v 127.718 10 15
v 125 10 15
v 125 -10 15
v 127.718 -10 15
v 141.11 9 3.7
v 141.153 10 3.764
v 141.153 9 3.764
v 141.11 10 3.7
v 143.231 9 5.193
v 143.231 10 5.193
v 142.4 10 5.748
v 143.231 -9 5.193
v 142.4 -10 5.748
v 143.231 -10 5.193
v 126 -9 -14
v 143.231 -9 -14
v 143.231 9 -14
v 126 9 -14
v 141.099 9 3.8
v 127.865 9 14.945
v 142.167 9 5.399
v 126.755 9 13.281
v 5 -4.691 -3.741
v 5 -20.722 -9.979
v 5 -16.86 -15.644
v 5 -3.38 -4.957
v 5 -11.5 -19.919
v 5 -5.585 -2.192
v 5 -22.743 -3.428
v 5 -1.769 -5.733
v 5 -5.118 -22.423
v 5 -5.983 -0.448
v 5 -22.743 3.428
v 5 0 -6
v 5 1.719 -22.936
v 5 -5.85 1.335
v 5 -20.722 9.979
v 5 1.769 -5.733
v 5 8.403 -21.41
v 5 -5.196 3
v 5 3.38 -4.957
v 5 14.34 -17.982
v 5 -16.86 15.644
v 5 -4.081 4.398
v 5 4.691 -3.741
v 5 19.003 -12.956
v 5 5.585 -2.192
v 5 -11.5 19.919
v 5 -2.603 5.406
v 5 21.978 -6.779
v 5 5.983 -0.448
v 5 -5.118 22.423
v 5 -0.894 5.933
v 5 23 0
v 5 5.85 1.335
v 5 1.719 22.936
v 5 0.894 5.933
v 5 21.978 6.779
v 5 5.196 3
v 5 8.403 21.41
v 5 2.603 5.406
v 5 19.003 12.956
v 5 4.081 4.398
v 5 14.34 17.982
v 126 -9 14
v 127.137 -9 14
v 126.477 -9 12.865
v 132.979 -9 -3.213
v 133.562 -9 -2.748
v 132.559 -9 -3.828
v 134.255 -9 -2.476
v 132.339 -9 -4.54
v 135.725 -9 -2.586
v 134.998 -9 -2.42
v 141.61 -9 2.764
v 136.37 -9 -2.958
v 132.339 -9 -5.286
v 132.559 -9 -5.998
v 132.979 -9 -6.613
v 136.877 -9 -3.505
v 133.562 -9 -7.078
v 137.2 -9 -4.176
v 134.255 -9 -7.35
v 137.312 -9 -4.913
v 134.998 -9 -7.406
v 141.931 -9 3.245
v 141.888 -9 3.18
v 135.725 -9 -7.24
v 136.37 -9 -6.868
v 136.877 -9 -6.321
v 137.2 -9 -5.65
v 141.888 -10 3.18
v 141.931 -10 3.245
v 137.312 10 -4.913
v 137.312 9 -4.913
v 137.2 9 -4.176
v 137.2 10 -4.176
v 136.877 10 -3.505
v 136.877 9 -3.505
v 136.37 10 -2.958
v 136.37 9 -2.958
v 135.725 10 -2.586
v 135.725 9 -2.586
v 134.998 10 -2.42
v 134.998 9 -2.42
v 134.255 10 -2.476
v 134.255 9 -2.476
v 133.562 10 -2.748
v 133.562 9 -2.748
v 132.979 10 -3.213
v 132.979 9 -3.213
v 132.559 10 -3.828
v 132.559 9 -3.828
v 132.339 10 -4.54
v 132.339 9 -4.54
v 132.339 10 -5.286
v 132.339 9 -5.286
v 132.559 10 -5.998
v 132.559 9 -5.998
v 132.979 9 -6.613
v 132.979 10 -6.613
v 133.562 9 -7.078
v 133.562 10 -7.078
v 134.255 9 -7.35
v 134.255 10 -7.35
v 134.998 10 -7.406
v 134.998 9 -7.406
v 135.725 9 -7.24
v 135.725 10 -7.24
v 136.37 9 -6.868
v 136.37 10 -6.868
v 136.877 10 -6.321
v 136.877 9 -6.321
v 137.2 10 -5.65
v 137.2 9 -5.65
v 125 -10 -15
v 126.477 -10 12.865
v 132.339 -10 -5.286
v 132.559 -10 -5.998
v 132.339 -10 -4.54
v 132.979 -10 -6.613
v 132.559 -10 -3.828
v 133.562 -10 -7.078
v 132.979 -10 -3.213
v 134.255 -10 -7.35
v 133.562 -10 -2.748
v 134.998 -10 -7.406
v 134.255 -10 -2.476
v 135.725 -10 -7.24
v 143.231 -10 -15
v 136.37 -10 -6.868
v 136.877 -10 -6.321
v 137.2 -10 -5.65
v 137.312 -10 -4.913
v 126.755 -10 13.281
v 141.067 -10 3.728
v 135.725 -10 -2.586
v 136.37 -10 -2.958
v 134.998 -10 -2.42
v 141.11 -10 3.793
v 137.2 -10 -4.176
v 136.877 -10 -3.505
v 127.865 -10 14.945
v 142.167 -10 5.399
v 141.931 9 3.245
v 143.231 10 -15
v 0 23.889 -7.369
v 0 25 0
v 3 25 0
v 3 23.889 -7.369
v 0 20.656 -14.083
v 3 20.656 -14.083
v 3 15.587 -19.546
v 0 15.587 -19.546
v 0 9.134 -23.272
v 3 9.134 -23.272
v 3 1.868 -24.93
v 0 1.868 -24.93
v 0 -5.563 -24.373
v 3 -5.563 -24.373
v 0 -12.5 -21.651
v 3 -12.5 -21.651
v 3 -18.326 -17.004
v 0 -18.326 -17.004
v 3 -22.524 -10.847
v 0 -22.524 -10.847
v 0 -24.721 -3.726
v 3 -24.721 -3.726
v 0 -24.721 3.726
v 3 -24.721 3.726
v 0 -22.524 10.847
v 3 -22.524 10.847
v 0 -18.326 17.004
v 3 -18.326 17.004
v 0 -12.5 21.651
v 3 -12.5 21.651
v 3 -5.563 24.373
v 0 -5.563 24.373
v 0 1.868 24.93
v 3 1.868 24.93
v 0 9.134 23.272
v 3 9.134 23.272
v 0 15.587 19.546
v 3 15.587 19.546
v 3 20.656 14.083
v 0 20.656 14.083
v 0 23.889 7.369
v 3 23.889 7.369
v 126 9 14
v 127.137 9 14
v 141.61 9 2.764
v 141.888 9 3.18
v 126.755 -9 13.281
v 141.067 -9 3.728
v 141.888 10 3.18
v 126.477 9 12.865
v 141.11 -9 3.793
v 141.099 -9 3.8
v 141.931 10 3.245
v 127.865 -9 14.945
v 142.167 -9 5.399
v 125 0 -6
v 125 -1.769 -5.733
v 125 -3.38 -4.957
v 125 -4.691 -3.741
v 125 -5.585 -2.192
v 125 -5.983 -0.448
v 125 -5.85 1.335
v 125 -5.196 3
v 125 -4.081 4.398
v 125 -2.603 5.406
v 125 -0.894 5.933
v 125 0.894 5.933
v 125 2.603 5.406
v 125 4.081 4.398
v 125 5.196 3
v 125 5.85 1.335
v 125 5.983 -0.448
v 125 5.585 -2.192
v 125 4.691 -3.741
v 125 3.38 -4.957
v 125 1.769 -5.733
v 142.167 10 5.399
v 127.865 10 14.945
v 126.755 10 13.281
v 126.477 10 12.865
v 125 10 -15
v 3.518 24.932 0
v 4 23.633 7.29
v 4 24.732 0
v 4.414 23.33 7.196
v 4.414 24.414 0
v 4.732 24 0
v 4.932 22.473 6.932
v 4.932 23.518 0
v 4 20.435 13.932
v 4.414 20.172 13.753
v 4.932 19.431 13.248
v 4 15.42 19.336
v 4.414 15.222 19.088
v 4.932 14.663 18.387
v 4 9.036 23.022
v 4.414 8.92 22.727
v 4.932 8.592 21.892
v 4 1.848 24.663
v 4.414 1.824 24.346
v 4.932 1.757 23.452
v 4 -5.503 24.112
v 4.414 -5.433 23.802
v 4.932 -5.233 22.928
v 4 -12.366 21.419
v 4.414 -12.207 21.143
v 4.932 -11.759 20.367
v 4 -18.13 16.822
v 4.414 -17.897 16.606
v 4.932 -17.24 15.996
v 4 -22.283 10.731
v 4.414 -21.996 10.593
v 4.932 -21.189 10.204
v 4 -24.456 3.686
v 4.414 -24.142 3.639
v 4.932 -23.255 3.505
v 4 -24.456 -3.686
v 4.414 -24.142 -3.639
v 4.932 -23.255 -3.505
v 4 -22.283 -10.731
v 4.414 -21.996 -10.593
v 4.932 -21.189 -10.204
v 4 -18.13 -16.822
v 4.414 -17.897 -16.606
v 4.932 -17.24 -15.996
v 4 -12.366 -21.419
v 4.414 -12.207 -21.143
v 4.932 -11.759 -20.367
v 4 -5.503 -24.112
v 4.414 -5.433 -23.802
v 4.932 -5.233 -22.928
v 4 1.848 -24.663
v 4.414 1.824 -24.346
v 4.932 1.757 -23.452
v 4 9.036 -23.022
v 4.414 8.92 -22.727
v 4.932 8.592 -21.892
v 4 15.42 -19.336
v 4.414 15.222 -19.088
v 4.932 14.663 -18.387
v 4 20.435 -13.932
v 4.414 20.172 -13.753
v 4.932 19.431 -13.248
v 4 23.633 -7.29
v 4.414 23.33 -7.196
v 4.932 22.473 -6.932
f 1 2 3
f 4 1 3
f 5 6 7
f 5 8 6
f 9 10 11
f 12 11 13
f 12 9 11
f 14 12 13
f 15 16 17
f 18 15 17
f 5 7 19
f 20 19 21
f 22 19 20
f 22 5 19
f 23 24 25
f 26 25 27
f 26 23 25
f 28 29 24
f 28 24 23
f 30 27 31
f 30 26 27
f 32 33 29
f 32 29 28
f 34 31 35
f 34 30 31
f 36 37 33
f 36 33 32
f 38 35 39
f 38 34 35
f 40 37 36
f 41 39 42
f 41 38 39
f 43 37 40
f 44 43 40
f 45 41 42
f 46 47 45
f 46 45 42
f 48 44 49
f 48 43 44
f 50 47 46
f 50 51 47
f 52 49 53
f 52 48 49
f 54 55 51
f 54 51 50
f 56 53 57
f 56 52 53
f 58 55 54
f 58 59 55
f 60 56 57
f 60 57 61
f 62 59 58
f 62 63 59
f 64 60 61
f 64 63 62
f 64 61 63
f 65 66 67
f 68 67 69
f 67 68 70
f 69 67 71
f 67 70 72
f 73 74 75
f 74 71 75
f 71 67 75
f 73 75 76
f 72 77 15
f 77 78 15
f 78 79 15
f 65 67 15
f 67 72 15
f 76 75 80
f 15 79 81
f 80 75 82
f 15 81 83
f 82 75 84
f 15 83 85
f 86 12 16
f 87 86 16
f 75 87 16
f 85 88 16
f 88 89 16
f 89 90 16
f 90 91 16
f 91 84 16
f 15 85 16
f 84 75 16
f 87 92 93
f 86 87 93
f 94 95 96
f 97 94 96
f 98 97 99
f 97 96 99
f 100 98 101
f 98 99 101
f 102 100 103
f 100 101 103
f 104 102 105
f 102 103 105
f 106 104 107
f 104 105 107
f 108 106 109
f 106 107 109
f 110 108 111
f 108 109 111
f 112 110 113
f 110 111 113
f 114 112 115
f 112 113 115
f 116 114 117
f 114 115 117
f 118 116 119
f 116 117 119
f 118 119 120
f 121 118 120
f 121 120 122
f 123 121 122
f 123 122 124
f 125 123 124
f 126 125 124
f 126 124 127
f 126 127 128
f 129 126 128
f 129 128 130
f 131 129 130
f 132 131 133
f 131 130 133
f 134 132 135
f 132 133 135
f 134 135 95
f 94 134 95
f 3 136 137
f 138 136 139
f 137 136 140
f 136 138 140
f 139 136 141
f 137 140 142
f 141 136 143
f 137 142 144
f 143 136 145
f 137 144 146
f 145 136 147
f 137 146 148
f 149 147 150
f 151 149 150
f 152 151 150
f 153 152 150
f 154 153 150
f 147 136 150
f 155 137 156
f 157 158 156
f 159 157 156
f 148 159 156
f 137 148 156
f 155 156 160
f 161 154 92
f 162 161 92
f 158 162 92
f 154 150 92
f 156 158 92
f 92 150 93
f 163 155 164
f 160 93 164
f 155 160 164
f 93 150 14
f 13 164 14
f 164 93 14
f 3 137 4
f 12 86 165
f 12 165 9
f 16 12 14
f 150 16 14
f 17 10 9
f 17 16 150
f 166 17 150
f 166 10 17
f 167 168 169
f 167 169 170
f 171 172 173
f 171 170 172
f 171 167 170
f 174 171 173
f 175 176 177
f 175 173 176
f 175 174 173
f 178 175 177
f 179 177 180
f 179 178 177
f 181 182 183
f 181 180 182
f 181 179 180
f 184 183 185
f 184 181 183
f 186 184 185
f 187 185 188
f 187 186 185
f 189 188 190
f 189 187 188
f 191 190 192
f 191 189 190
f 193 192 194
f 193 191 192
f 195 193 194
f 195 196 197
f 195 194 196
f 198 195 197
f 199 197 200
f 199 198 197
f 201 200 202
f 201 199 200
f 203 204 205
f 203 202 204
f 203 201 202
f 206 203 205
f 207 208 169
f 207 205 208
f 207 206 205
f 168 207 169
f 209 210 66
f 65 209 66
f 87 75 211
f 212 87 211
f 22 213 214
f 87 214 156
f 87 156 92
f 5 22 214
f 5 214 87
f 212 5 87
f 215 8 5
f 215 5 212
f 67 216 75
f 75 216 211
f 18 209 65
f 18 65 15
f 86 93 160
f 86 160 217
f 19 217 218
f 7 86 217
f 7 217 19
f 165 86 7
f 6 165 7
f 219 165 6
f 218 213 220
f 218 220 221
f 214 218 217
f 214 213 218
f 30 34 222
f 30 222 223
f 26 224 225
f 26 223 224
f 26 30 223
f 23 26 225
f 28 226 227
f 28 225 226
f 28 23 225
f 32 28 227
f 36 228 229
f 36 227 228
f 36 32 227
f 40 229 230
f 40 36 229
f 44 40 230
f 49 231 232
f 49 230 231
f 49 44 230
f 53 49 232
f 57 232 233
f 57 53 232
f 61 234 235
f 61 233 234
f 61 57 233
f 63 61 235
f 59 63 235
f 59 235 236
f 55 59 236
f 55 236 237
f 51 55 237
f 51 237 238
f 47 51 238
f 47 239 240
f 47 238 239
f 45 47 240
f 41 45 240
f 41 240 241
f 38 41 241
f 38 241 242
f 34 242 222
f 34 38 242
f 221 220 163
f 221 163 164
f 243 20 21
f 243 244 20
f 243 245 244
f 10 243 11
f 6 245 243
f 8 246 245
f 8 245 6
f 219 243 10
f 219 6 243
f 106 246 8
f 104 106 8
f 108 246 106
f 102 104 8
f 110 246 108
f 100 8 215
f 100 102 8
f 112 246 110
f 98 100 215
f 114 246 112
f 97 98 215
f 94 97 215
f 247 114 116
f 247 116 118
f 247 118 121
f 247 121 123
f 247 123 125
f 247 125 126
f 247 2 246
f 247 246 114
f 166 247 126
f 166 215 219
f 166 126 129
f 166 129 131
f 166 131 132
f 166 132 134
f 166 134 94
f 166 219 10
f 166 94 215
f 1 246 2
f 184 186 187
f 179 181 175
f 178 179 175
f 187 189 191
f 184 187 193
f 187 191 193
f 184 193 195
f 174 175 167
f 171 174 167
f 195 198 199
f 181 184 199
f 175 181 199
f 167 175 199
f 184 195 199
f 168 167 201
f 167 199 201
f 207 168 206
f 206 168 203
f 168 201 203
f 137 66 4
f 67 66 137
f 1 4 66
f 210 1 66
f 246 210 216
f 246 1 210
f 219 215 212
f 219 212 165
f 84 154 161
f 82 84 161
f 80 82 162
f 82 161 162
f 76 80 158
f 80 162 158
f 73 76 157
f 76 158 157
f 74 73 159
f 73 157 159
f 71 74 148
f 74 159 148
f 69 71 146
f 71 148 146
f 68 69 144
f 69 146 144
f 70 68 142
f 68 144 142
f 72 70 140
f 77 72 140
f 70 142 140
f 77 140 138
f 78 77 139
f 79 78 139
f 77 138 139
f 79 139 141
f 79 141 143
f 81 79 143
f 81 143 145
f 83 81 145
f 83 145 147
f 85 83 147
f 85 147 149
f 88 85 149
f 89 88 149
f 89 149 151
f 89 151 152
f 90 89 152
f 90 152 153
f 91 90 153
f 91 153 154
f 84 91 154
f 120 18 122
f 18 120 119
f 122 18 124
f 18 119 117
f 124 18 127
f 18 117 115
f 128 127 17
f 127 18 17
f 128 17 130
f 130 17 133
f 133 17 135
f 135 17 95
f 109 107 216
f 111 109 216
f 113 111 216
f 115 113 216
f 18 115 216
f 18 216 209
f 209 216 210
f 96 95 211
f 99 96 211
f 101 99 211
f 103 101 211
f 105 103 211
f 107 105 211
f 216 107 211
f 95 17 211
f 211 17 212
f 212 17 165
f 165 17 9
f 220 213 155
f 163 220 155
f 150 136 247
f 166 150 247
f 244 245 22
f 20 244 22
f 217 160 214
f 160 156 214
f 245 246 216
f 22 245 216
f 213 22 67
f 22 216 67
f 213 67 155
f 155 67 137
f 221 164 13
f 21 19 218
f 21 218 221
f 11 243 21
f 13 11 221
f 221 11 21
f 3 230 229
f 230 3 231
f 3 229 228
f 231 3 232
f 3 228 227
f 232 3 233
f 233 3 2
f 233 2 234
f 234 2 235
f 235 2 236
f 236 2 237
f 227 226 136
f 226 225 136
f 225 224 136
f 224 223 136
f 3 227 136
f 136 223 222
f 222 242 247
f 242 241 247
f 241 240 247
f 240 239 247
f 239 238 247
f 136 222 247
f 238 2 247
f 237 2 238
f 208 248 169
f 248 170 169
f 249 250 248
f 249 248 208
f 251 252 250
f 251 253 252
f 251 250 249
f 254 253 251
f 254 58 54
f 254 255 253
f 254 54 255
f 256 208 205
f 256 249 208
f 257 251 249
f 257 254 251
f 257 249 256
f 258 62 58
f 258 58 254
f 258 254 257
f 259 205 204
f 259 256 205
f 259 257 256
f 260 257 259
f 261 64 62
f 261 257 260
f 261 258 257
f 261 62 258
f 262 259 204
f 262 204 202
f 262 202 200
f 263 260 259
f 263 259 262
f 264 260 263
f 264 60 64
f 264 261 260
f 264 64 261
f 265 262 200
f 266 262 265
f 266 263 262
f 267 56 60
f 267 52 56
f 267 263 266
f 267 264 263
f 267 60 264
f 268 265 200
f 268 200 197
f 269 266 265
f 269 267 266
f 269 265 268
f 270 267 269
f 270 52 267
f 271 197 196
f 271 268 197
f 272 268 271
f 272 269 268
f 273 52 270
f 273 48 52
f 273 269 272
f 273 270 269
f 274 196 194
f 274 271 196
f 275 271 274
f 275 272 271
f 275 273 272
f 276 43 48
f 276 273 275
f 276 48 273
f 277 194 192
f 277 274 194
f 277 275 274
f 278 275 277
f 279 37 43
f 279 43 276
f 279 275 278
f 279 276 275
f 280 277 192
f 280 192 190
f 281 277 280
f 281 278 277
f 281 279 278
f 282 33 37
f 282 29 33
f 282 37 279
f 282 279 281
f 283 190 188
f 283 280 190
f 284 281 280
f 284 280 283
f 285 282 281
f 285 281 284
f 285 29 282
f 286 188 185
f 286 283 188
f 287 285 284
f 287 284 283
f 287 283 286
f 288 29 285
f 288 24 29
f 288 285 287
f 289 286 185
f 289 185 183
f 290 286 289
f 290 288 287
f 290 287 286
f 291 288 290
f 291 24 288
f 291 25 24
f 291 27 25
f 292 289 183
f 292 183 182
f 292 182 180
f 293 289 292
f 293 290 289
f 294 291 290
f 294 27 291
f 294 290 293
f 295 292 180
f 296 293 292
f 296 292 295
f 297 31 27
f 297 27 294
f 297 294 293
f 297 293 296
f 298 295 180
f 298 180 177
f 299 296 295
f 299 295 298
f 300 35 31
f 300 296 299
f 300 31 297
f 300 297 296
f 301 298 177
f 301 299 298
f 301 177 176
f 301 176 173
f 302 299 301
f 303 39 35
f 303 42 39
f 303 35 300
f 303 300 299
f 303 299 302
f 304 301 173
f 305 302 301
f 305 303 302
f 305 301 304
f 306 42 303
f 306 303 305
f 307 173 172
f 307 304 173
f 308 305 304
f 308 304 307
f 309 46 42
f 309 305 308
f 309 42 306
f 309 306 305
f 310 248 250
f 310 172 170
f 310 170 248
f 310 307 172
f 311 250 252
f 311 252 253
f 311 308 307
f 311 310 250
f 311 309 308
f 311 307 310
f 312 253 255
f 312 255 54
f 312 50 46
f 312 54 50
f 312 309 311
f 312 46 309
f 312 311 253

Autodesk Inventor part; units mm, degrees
ref_plane "YZ Plane" through (0, 0, 0) normal (1, 0, 0) x (0, 1, 0)
ref_plane "XZ Plane" through (0, 0, 0) normal (0, 1, 0) x (-1, 0, 0)
ref_plane "XY Plane" through (0, 0, 0) normal (0, 0, 1) x (1, 0, 0)
sketch "Sketch1" plane through (0, 0, 0) normal (1, 0, 0) x (0, 1, 0)
  circle A0 centre (0, 0) radius 25
  dimension "d0" = 50
extrude "Extrusion1" add sketch "Sketch1" along normal blind 5
fillet "Fillet1" radius 2 1 edges at (5, -25, 0)
sketch "Sketch2" plane through (5, 0, 0) normal (1, 0, 0) x (0, 0, -1)
  circle A0 centre (0, 0) radius 6
  dimension "d4" = 12
extrude "Extrusion2" add sketch "Sketch2" along normal blind 120
sketch "Sketch3" plane through (125, 0, 0) normal (1, 0, 0) x (0, 0, -1)
  line L0 (15, 10) -> (-15, 10)
  line L1 (-15, 10) -> (-15, -10)
  line L2 (-15, -10) -> (15, -10)
  line L3 (15, -10) -> (15, 10)
  point P0 (0, 0)
  dimension "d7" = 20
  dimension "d8" = 30
  dimension "d9" = 15
  dimension "d10" = 10
extrude "Extrusion3" add sketch "Sketch3" along normal blind 20
sketch "Sketch4" plane through (145, 0, 0) normal (1, 0, 0) x (0, 0, -1)
  line L0 (-14, -9) -> (14, -9)
  line L1 (14, -9) -> (14, 9)
  line L2 (14, 9) -> (-14, 9)
  line L3 (-14, 9) -> (-14, -9)
  line L4 (-15, -10) -> (15, -10) projected
  line L5 (15, -10) -> (15, 10) projected
  point P0 (0, 0)
  dimension "d13" = 28
  dimension "d14" = 18
  dimension "d15" = 1
  dimension "d16" = 1
extrude "Extrusion4" cut sketch "Sketch4" against normal blind 19
sketch "Sketch5" plane through (125, 10, 15) normal (0, 1, 0) x (1, 0, 0)
  line L0 (0, 0) -> (20, 0) projected
  line L1 (2.7176, 0) -> (1.4771, 2.1348)
  line L2 (1.4771, 2.1348) -> (16.6105, 12.2356)
  line L3 (16.6105, 12.2356) -> (18.2313, 9.8073)
  line L4 (18.2313, 9.8073) -> (18.2313, 30)
  line L5 (0, 30) -> (20, 30) projected
  line L6 (20, 30) -> (20, 0) projected
  line L7 (20, 30) -> (20, 0)
  line L8 (20, 0) -> (2.7176, 0)
  point P0 (-125, 15)
extrude "Extrusion5" cut sketch "Sketch5" against normal blind 30
sketch "Sketch6" plane through (141.6105, 9, 2.7644) normal (0.5551496, 0, 0.8317505) x (0.8317505, 0, -0.5551496)
  line L0 (-18.1947, 1) -> (0, 1) projected
  line L1 (0, -19) -> (-18.1947, -19) projected
  line L2 (0, 1) -> (-18.1947, 1)
  line L3 (-18.1947, 1) -> (-18.1947, -19)
  line L4 (-18.1947, -19) -> (0, -19)
  line L5 (0, -19) -> (0, 1)
  point P0 (-116.25, -9)
extrude "Extrusion6" add sketch "Sketch6" along normal blind 0.5
sketch "Sketch7" plane through (125, -10, -15) normal (0, -1, 0) x (1, 0, 0)
  circle A0 centre (9.8115, 10.087) radius 2.5
  point P0 (-125, 15)
  dimension "d23" = 5
extrude "Extrusion7" cut sketch "Sketch7" against normal blind 25
sketch "Sketch8" plane through (143.2313, -10, 5.1927) normal (-0.8317505, 0, 0.5551496) x (0.5551496, 0, 0.8317505)
  line L0 (-16.7953, 0) -> (0, 0) projected
  line L1 (0, 20) -> (-16.7953, 20) projected
  line L2 (0, 0) -> (-2.3419, 0)
  line L3 (-2.3419, 0) -> (-2.3419, 20)
  line L4 (-2.3419, 20) -> (0, 20)
  line L5 (0, 20) -> (0, 0)
  point P0 (-83.8338, 10)
  point P1 (-2.3419, 0)
extrude "Extrusion8" add sketch "Sketch8" along normal blind 1
sketch "Sketch9" plane through (141.8881, 9, 3.1803) normal (0.5551496, 0, 0.8317505) x (0.8317505, 0, -0.5551496)
  line L0 (-18.1947, -19) -> (-18.3481, -19) projected
  line L1 (-18.1947, -18) -> (0, -18) projected
  line L2 (-18.1947, -19) -> (-0.9871, -19)
  line L3 (-0.9871, -19) -> (-0.9871, -18)
  line L4 (-0.9871, -18) -> (-18.1947, -18)
  line L5 (-18.1947, -18) -> (-18.1947, -19)
  point P0 (-116.25, -9)
  point P1 (-18.1947, -18)
extrude "Extrusion9" add sketch "Sketch9" along normal blind 2
sketch "Sketch10" plane through (141.8881, 9, 3.1803) normal (0.5551496, 0, 0.8317505) x (0.8317505, 0, -0.5551496)
  line L0 (-18.1947, 1) -> (-18.1947, -18) projected
  line L1 (1.107, 0) -> (-3.893, 0) projected
  line L2 (-18.1947, 1) -> (-0.936, 1)
  line L3 (-0.936, 1) -> (-0.936, 0)
  line L4 (-0.936, 0) -> (-18.1947, 0)
  line L5 (-18.1947, 0) -> (-18.1947, 1)
  point P0 (-116.25, -9)
  point P1 (-3.893, 0)
extrude "Extrusion10" add sketch "Sketch10" along normal blind 2
properties part number "reception robot design"
